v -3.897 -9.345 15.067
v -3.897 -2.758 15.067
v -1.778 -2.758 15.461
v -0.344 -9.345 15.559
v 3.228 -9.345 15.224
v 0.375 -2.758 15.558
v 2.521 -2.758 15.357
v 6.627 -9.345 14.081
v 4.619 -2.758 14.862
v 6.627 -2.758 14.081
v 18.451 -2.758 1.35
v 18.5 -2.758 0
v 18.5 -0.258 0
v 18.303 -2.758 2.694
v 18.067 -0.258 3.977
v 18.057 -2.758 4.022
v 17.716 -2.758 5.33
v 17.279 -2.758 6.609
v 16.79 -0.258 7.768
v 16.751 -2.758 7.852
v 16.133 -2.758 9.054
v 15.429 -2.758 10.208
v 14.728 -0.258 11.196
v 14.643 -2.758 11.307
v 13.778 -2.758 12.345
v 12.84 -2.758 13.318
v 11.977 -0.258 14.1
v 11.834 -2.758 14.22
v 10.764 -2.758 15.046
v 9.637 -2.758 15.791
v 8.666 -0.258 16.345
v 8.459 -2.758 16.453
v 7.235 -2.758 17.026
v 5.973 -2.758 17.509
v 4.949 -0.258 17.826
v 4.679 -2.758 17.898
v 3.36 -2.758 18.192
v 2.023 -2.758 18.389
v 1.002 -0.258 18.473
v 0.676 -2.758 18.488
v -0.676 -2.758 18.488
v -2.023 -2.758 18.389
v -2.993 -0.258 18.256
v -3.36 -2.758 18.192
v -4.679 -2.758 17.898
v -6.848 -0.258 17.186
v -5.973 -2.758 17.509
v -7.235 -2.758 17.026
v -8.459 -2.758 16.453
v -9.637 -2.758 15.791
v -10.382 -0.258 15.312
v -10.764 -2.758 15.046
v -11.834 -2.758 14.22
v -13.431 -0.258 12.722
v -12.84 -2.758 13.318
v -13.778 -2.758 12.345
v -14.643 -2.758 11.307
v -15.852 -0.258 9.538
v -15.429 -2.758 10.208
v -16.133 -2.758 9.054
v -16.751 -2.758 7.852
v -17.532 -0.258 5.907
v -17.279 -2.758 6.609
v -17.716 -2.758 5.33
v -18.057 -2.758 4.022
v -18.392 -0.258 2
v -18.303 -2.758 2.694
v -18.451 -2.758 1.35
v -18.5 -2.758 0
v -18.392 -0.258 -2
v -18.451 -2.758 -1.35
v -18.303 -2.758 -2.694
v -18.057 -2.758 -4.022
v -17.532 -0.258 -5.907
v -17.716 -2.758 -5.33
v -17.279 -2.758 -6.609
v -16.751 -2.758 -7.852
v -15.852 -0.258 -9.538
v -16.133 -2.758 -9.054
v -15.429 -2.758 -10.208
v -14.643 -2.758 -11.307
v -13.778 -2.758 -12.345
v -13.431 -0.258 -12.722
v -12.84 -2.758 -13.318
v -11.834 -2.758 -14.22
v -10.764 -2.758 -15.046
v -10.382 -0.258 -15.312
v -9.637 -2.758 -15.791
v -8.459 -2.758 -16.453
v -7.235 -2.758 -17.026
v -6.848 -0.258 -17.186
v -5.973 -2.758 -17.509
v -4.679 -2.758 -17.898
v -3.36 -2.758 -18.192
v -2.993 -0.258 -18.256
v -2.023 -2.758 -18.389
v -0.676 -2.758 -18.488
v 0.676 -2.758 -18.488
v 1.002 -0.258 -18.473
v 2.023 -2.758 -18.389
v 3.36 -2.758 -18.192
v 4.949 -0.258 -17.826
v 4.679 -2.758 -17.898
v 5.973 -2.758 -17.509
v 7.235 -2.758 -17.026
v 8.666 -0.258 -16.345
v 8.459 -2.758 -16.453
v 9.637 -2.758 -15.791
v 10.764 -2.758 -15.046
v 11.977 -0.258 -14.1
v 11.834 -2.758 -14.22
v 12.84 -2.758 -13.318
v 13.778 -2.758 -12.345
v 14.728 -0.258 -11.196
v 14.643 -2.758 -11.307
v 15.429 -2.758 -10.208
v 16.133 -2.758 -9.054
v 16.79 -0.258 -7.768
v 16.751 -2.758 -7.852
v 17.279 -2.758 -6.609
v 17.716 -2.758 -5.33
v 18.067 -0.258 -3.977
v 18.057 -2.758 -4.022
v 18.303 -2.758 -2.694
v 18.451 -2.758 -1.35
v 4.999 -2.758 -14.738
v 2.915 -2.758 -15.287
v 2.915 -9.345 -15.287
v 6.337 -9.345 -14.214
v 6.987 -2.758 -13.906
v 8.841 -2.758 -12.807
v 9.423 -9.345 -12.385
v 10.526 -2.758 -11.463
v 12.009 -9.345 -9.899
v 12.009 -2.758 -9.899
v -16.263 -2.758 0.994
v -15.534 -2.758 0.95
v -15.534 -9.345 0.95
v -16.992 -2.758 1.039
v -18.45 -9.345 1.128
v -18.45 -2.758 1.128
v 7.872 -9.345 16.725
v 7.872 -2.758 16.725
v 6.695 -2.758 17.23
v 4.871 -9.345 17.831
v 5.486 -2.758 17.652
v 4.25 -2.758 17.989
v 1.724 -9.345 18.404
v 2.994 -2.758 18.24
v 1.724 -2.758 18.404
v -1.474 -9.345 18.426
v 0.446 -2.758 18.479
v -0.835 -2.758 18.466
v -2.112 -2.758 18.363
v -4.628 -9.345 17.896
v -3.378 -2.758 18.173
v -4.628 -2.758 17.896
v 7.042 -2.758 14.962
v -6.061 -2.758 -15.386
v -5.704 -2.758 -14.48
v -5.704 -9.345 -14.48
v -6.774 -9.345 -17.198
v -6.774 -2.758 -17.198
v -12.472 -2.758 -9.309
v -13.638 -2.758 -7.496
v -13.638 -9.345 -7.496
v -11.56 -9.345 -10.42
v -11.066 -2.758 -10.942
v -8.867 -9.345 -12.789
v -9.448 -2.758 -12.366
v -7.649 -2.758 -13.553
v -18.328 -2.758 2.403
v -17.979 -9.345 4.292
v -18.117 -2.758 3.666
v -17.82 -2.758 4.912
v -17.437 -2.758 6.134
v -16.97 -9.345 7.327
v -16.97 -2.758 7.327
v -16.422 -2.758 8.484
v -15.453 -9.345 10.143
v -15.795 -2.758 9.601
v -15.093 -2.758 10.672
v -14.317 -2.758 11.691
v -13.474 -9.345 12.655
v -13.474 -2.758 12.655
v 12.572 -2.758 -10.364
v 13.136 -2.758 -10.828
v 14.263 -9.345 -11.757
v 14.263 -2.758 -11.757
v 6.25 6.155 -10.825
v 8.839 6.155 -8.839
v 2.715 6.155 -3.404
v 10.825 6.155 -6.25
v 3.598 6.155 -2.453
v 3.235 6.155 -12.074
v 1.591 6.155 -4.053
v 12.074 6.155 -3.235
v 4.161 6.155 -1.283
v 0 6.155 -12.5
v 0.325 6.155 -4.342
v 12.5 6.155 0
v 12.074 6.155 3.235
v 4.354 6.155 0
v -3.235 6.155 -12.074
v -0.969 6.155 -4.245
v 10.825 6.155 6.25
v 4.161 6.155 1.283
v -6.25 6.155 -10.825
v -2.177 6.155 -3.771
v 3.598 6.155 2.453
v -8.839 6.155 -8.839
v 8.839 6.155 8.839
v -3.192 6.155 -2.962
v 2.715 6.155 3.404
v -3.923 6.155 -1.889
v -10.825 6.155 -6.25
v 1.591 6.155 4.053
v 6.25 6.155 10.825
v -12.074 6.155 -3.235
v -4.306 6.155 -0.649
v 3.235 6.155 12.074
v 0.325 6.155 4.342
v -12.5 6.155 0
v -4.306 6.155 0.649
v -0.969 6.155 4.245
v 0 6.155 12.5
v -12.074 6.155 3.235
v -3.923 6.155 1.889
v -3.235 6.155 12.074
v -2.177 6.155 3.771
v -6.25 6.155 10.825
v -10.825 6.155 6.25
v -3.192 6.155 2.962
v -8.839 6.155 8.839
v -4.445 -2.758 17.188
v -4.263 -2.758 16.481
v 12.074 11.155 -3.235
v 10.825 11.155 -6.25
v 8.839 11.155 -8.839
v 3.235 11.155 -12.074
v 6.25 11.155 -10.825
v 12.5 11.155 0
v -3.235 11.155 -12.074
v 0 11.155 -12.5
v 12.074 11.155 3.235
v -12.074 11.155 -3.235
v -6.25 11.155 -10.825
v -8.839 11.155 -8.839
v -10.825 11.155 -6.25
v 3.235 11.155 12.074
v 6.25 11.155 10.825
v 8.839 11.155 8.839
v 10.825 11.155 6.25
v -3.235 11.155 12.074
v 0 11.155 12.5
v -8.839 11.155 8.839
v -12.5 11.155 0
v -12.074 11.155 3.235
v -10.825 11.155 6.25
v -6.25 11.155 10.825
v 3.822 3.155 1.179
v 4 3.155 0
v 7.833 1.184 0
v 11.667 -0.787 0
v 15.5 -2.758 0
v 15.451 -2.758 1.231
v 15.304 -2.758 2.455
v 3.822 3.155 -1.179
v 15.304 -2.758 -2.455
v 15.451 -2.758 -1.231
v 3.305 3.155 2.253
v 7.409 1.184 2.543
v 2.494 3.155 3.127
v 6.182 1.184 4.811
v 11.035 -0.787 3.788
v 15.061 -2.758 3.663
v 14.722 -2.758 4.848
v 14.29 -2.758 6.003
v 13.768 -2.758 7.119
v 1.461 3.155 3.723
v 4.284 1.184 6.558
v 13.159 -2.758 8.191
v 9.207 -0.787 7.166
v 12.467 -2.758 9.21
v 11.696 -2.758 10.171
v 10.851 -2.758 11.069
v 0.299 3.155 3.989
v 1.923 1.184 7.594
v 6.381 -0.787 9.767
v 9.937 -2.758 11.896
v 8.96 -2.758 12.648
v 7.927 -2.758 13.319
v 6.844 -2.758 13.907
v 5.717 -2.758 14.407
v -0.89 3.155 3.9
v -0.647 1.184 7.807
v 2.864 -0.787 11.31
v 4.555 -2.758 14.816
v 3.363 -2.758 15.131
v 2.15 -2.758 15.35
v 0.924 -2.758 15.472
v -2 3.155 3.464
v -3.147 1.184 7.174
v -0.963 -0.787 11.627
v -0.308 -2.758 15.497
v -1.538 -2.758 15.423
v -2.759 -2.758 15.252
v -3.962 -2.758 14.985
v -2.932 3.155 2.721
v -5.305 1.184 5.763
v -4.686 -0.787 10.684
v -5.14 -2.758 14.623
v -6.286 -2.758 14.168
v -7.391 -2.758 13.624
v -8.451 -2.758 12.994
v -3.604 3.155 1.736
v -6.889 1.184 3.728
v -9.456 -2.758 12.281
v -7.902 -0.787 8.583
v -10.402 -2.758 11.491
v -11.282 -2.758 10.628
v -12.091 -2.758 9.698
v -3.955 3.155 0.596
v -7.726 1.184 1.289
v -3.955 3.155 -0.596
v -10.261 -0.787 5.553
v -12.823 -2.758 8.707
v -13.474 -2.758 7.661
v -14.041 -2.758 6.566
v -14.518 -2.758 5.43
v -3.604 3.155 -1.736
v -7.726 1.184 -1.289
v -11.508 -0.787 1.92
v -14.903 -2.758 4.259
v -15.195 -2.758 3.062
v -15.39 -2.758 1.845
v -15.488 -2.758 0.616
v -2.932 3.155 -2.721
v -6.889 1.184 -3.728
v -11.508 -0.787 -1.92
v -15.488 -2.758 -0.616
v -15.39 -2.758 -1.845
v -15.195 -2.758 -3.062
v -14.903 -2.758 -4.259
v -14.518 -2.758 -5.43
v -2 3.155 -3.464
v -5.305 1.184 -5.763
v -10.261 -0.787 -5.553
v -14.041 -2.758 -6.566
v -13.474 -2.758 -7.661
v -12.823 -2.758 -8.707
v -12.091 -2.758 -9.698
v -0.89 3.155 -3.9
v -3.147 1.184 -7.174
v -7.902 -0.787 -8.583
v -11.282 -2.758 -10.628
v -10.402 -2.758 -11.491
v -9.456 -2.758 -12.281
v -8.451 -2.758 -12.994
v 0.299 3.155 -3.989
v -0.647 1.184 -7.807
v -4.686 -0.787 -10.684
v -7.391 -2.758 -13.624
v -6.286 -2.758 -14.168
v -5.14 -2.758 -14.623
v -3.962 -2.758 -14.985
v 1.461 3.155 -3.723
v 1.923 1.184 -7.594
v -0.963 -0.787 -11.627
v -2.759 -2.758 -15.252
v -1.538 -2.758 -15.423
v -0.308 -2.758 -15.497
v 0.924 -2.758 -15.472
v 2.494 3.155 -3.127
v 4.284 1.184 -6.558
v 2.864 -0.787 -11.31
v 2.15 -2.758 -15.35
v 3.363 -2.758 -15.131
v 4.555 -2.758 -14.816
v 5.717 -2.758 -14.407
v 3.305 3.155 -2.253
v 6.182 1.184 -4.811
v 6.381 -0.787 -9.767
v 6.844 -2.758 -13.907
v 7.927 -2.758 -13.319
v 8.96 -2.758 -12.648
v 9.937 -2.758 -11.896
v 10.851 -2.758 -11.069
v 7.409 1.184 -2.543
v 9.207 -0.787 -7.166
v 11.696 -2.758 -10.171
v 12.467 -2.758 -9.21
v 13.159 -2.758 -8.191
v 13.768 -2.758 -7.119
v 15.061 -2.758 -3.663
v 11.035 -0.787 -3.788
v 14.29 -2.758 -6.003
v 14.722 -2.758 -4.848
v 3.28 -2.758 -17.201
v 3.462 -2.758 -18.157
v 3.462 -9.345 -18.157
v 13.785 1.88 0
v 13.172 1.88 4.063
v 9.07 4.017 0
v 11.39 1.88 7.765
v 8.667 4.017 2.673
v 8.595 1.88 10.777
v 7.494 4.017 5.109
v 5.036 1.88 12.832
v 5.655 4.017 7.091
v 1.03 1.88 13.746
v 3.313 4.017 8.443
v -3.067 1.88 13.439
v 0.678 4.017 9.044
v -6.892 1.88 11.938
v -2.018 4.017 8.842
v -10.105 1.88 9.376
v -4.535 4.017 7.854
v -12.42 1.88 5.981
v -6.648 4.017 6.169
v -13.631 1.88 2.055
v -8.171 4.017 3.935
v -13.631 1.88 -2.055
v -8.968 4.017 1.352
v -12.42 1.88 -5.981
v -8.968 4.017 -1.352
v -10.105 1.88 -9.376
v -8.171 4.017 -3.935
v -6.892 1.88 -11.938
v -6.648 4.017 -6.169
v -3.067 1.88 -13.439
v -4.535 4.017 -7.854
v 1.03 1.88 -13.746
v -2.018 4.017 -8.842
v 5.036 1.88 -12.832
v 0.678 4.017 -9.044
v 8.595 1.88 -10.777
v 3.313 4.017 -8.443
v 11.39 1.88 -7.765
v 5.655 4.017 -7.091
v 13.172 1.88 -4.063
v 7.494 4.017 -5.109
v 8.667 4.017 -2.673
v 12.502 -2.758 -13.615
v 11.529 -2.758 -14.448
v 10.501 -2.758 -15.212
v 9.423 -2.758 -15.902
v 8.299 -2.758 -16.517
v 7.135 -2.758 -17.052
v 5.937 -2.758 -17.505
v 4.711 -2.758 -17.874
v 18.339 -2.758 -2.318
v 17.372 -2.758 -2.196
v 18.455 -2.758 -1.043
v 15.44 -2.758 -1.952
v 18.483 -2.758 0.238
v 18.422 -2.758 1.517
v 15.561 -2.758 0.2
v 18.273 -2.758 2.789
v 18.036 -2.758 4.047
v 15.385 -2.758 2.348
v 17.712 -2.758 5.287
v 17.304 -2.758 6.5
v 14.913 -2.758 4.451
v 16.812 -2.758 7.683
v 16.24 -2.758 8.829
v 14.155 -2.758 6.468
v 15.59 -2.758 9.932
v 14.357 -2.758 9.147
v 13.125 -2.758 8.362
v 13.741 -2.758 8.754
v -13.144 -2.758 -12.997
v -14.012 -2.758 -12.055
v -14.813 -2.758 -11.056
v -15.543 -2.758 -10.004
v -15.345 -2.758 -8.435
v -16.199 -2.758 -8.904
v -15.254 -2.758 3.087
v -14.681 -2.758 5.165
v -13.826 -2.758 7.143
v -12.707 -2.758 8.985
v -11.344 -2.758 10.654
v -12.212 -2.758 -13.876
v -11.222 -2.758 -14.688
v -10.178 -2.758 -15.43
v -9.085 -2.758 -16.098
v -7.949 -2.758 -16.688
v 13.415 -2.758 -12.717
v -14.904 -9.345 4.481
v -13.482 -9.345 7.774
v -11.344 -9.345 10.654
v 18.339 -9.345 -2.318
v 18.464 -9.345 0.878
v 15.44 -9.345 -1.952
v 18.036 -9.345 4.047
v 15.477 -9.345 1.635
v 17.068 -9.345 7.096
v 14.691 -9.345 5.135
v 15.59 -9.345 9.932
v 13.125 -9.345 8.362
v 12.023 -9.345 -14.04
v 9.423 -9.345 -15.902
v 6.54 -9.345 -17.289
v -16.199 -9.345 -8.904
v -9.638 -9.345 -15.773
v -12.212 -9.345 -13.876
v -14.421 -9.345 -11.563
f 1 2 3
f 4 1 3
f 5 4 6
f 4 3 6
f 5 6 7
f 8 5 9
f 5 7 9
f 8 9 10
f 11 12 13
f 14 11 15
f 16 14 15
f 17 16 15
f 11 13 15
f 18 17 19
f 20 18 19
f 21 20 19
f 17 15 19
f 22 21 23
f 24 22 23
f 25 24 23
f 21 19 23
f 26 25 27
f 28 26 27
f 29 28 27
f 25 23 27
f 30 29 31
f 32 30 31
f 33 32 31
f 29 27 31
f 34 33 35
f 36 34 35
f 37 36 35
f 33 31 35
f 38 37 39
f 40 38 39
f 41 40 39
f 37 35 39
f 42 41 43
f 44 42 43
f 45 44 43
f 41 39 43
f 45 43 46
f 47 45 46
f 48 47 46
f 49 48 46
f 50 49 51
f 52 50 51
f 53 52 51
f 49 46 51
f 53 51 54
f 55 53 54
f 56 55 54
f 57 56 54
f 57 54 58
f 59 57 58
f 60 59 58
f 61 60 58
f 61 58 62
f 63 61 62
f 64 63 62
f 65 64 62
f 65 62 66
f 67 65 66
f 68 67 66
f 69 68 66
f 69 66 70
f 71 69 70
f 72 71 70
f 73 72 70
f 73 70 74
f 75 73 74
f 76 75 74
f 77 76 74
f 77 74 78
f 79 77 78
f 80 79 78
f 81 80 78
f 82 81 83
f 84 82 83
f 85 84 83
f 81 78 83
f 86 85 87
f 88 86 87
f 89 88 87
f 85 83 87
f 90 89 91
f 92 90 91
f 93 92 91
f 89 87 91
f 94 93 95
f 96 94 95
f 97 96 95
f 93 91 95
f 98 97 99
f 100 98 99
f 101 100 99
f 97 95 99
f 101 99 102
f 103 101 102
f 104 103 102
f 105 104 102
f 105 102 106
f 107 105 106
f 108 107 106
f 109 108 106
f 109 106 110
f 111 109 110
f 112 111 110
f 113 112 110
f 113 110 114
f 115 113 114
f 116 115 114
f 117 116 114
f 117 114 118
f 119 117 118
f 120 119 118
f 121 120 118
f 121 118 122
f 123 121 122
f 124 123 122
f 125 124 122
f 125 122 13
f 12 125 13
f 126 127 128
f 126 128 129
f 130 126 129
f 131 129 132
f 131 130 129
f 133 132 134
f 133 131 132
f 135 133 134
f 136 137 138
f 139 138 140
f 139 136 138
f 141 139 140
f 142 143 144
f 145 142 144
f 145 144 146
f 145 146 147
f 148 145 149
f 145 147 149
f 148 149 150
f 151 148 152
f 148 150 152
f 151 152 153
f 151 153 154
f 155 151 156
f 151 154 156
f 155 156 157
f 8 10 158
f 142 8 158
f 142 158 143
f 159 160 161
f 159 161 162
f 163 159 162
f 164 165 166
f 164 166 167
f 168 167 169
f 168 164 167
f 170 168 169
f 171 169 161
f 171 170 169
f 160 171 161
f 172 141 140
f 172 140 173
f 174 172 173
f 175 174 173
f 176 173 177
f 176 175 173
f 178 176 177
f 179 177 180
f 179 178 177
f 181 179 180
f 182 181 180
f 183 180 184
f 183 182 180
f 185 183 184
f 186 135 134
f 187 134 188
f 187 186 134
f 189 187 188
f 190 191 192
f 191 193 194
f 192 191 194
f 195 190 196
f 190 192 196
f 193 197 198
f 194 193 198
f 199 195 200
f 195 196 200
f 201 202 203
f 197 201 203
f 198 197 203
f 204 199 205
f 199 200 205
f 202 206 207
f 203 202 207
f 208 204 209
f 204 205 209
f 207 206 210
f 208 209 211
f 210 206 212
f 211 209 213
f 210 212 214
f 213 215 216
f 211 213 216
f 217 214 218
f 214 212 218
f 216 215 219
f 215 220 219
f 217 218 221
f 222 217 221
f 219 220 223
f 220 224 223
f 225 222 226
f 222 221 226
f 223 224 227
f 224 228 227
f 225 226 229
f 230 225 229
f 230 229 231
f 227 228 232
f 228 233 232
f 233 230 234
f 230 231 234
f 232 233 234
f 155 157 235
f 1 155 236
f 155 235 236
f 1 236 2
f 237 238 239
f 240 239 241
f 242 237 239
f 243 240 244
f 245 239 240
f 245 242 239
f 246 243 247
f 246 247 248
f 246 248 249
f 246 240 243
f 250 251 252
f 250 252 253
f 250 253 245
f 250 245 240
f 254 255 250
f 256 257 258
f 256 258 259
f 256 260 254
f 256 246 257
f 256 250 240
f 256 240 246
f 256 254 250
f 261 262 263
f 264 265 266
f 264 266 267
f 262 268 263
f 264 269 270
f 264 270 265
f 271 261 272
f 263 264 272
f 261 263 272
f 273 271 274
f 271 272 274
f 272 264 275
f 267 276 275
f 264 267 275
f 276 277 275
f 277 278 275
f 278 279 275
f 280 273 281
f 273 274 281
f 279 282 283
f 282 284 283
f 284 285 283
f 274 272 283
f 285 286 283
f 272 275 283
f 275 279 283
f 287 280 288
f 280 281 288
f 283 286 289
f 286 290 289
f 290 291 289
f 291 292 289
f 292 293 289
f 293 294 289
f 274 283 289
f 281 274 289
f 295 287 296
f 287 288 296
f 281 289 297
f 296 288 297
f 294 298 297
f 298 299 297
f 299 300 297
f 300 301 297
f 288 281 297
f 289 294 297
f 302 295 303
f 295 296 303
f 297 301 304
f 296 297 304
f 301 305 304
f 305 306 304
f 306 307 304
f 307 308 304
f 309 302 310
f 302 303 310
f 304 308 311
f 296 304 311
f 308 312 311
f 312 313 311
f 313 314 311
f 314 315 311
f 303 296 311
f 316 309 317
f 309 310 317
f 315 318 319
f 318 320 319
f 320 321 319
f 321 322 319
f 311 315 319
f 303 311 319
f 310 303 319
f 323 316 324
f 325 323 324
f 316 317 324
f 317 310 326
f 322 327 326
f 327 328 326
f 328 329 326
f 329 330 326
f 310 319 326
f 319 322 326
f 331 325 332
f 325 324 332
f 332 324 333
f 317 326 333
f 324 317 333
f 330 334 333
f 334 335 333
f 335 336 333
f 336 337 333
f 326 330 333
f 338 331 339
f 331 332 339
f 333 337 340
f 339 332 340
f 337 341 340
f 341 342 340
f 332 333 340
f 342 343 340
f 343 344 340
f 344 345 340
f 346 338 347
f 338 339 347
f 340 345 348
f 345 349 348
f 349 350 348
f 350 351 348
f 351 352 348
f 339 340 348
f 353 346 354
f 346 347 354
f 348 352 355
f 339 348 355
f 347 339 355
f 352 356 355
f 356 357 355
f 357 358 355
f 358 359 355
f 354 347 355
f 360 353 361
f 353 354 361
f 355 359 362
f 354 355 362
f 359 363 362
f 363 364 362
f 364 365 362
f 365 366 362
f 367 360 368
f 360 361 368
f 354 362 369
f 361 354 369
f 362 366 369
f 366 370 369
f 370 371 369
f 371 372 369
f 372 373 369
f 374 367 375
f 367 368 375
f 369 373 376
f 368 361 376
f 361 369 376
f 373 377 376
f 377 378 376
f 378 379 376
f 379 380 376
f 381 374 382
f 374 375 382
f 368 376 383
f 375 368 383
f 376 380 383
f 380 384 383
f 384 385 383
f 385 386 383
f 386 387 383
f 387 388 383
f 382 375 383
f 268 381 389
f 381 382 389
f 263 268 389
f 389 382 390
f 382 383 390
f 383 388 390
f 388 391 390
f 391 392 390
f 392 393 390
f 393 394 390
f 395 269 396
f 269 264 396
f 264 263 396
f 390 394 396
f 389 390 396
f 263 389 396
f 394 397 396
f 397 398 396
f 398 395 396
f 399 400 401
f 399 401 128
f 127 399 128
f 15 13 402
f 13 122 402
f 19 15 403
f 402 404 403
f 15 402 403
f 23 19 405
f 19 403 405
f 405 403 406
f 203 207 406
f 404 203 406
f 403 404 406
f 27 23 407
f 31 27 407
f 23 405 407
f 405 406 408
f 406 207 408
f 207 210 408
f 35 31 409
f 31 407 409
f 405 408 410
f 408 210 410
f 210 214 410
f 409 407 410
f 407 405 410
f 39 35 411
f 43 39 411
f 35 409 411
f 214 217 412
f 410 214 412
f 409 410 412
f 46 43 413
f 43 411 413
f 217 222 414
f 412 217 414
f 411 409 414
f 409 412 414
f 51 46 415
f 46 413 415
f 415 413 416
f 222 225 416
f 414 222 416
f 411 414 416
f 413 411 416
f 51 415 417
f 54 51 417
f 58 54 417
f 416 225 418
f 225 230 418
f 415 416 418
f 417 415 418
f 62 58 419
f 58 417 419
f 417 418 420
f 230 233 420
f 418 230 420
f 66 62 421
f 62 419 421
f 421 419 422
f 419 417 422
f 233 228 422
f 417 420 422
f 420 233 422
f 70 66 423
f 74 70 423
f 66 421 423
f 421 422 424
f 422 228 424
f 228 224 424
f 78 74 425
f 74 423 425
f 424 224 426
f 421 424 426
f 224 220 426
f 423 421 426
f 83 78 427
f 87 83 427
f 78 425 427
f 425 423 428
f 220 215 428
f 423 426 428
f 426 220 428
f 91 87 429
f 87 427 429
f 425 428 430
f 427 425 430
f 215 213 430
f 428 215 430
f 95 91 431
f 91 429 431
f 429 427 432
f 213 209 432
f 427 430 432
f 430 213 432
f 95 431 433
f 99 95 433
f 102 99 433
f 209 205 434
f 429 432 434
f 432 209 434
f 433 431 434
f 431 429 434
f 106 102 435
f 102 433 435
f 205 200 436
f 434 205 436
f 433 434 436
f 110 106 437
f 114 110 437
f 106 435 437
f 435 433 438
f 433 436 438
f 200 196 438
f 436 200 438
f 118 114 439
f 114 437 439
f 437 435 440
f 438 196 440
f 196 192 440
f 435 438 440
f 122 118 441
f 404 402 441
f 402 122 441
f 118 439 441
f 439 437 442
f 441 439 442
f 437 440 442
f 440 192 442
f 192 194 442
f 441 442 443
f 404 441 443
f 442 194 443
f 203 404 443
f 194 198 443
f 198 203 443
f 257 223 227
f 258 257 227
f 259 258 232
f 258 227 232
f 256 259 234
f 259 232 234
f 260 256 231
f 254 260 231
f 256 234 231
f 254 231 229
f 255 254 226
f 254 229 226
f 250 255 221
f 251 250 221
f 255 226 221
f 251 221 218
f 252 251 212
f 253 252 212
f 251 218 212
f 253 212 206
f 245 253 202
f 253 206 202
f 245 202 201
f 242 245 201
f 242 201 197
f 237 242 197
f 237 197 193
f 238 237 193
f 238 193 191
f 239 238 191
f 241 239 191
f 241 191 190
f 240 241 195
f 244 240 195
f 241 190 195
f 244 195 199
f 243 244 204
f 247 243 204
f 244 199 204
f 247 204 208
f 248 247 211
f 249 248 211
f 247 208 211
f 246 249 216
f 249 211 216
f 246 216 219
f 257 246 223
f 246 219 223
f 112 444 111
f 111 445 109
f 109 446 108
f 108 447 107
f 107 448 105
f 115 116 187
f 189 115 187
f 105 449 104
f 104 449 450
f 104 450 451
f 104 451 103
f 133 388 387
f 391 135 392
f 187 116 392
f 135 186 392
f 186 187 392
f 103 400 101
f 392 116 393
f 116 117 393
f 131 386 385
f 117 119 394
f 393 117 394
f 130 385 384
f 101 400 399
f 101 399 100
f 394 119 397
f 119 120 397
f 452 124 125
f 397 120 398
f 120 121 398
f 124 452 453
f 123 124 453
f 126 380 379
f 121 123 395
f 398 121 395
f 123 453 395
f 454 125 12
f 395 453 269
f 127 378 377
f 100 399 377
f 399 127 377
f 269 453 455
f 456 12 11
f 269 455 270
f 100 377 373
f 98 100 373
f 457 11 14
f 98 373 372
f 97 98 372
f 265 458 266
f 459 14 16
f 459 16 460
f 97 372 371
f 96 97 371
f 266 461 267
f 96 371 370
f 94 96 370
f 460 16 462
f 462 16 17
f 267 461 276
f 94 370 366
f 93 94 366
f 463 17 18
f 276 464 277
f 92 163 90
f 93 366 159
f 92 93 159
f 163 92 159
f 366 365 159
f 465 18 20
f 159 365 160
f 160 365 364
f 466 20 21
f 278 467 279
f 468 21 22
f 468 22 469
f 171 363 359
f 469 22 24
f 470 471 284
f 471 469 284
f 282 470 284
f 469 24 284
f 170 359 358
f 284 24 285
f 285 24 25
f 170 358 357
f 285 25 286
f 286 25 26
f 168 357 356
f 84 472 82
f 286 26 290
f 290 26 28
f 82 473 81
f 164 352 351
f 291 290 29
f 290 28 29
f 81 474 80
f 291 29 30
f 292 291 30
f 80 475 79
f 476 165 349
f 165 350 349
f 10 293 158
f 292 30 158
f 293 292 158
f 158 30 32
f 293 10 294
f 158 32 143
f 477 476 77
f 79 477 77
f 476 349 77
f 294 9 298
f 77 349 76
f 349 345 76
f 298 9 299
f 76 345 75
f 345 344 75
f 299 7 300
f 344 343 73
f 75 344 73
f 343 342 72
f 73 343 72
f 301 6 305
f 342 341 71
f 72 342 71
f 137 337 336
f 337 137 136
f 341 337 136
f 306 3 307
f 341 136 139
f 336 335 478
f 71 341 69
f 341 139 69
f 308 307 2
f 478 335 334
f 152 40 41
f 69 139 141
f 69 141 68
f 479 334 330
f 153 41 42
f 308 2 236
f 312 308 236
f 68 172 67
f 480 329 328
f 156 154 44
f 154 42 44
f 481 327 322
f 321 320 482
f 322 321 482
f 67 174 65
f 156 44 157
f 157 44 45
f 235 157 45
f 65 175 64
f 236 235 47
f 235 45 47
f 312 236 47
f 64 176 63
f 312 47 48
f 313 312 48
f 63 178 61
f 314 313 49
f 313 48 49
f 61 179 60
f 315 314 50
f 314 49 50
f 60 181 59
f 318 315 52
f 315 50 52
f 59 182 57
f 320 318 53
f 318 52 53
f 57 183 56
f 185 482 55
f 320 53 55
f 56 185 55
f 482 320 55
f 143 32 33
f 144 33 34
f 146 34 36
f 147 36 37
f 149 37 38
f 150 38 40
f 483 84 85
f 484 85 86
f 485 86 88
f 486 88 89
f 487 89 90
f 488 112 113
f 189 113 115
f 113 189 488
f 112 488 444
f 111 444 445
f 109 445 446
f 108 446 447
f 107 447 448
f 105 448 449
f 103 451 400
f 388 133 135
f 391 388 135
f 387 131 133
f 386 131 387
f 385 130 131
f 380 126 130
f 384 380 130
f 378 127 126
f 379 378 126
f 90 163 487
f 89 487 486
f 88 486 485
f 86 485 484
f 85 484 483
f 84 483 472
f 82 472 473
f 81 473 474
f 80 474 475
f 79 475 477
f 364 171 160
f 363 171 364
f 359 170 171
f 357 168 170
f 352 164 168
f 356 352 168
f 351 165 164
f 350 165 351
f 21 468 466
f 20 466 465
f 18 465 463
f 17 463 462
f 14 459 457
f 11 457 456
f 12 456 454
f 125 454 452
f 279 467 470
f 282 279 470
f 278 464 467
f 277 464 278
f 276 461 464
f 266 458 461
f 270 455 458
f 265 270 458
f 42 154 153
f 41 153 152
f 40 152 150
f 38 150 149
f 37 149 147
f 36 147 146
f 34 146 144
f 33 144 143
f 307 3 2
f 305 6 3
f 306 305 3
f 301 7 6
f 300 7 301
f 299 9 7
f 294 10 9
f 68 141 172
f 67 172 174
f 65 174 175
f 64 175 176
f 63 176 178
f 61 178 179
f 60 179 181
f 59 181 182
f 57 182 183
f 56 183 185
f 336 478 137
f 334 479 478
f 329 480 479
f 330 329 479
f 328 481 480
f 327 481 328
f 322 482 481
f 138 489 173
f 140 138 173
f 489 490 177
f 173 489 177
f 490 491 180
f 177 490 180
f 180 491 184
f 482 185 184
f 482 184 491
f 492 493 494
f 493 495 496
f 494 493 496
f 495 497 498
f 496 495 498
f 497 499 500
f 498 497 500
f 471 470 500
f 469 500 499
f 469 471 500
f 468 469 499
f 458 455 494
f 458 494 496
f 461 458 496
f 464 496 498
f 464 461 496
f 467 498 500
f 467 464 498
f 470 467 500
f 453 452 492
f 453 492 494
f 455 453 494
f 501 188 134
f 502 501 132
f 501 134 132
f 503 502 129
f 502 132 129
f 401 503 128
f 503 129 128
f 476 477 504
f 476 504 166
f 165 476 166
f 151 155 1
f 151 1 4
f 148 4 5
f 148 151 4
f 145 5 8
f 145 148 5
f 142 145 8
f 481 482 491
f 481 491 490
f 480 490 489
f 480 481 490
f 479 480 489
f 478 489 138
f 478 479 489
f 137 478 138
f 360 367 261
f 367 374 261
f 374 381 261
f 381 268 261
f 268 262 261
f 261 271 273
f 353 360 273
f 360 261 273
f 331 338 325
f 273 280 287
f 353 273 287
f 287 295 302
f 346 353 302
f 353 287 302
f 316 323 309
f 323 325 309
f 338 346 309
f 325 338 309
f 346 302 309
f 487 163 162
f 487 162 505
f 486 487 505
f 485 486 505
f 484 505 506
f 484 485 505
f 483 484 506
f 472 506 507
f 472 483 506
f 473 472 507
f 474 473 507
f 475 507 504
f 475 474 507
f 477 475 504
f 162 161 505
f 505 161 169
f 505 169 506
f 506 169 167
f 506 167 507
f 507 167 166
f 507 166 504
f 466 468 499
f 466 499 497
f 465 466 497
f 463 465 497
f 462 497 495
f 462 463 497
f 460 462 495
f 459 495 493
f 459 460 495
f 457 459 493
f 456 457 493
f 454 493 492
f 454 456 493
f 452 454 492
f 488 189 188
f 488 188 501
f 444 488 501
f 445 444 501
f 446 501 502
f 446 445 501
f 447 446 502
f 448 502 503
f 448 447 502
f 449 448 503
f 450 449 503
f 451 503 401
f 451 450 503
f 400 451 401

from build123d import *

# Parameters (mm, degrees)
EXTRUDE_START   = 3.5
EXTRUDE_3_DEPTH = 9
SKETCH_4_R      = 12.5
EXTRUDE_4_DEPTH = 5


with BuildPart() as part:
    # 草圖1 → 旋轉1 (revolve)
    with BuildSketch(Plane.XY):
        Polygon((0, 6.154761905), (0, 3.154761905), (4, 3.154761905), (15.5, -2.757936508), (18.5, -2.757936508), (18.5, -0.257936508), (4.354320213, 6.154761905), align=None)
    revolve(axis=Axis((0, 6.154761905, 0), (0, -1, 0)))

    # 草圖2 → 填料-伸長3 (add)
    with BuildSketch(Plane.XZ.offset(-3.154761905).offset(EXTRUDE_START)):
        with BuildLine():
            Line((-4.628340567, 17.895656272), (-3.896757076, 15.066960653))
            ThreePointArc((-3.896757076, 15.066960653), (1.45159982, 15.49486615), (6.627417355, 14.081028309))
            Line((6.627417355, 14.081028309), (7.871659433, 16.724623391))
            ThreePointArc((7.871659433, 16.724623391), (1.724125523, 18.40389744), (-4.628340567, 17.895656272))
        make_face()
        with BuildLine():
            Line((18.338538597, -2.318200146), (15.439838321, -1.951771416))
            ThreePointArc((15.439838321, -1.951771416), (15.185062434, 3.407623498), (13.12536695, 8.361983105))
            Line((13.12536695, 8.361983105), (15.58954462, 9.931875369))
            ThreePointArc((15.58954462, 9.931875369), (18.035930673, 4.047376258), (18.338538597, -2.318200146))
        make_face()
        with BuildLine():
            Line((3.462180724, -18.157349874), (2.914927508, -15.287289382))
            ThreePointArc((2.914927508, -15.287289382), (7.933284886, -13.388839007), (12.008679966, -9.898970881))
            Line((12.008679966, -9.898970881), (14.263209011, -11.757419722))
            ThreePointArc((14.263209011, -11.757419722), (9.422692651, -15.902481347), (3.462180724, -18.157349874))
        make_face()
        with BuildLine():
            Line((-16.198793235, -8.903659222), (-13.638314046, -7.496293018))
            ThreePointArc((-13.638314046, -7.496293018), (-10.282022732, -11.682381074), (-5.703594571, -14.479883563))
            Line((-5.703594571, -14.479883563), (-6.774396662, -17.198360377))
            ThreePointArc((-6.774396662, -17.198360377), (-12.212386349, -13.875650236), (-16.198793235, -8.903659222))
        make_face()
        with BuildLine():
            Line((-13.47358552, 12.65458585), (-11.343869138, 10.654325507))
            ThreePointArc((-11.343869138, 10.654325507), (-14.287924407, 6.168730433), (-15.533695269, 0.949910686))
            Line((-15.533695269, 0.949910686), (-18.450016402, 1.128248458))
            ThreePointArc((-18.450016402, 1.128248458), (-16.970362498, 7.326857885), (-13.47358552, 12.65458585))
        make_face()
    extrude(amount=EXTRUDE_3_DEPTH)

    # 草圖4 → 填料-伸長4 (add)
    with BuildSketch(Plane(origin=(0, 6.154761905, 0), x_dir=(1, 0, 0), z_dir=(0, 1, 0))):
        with Locations(Location((0, 0, 0), (0, 0, 180))):
            Circle(SKETCH_4_R)
    extrude(amount=EXTRUDE_4_DEPTH)


solid = part.part
